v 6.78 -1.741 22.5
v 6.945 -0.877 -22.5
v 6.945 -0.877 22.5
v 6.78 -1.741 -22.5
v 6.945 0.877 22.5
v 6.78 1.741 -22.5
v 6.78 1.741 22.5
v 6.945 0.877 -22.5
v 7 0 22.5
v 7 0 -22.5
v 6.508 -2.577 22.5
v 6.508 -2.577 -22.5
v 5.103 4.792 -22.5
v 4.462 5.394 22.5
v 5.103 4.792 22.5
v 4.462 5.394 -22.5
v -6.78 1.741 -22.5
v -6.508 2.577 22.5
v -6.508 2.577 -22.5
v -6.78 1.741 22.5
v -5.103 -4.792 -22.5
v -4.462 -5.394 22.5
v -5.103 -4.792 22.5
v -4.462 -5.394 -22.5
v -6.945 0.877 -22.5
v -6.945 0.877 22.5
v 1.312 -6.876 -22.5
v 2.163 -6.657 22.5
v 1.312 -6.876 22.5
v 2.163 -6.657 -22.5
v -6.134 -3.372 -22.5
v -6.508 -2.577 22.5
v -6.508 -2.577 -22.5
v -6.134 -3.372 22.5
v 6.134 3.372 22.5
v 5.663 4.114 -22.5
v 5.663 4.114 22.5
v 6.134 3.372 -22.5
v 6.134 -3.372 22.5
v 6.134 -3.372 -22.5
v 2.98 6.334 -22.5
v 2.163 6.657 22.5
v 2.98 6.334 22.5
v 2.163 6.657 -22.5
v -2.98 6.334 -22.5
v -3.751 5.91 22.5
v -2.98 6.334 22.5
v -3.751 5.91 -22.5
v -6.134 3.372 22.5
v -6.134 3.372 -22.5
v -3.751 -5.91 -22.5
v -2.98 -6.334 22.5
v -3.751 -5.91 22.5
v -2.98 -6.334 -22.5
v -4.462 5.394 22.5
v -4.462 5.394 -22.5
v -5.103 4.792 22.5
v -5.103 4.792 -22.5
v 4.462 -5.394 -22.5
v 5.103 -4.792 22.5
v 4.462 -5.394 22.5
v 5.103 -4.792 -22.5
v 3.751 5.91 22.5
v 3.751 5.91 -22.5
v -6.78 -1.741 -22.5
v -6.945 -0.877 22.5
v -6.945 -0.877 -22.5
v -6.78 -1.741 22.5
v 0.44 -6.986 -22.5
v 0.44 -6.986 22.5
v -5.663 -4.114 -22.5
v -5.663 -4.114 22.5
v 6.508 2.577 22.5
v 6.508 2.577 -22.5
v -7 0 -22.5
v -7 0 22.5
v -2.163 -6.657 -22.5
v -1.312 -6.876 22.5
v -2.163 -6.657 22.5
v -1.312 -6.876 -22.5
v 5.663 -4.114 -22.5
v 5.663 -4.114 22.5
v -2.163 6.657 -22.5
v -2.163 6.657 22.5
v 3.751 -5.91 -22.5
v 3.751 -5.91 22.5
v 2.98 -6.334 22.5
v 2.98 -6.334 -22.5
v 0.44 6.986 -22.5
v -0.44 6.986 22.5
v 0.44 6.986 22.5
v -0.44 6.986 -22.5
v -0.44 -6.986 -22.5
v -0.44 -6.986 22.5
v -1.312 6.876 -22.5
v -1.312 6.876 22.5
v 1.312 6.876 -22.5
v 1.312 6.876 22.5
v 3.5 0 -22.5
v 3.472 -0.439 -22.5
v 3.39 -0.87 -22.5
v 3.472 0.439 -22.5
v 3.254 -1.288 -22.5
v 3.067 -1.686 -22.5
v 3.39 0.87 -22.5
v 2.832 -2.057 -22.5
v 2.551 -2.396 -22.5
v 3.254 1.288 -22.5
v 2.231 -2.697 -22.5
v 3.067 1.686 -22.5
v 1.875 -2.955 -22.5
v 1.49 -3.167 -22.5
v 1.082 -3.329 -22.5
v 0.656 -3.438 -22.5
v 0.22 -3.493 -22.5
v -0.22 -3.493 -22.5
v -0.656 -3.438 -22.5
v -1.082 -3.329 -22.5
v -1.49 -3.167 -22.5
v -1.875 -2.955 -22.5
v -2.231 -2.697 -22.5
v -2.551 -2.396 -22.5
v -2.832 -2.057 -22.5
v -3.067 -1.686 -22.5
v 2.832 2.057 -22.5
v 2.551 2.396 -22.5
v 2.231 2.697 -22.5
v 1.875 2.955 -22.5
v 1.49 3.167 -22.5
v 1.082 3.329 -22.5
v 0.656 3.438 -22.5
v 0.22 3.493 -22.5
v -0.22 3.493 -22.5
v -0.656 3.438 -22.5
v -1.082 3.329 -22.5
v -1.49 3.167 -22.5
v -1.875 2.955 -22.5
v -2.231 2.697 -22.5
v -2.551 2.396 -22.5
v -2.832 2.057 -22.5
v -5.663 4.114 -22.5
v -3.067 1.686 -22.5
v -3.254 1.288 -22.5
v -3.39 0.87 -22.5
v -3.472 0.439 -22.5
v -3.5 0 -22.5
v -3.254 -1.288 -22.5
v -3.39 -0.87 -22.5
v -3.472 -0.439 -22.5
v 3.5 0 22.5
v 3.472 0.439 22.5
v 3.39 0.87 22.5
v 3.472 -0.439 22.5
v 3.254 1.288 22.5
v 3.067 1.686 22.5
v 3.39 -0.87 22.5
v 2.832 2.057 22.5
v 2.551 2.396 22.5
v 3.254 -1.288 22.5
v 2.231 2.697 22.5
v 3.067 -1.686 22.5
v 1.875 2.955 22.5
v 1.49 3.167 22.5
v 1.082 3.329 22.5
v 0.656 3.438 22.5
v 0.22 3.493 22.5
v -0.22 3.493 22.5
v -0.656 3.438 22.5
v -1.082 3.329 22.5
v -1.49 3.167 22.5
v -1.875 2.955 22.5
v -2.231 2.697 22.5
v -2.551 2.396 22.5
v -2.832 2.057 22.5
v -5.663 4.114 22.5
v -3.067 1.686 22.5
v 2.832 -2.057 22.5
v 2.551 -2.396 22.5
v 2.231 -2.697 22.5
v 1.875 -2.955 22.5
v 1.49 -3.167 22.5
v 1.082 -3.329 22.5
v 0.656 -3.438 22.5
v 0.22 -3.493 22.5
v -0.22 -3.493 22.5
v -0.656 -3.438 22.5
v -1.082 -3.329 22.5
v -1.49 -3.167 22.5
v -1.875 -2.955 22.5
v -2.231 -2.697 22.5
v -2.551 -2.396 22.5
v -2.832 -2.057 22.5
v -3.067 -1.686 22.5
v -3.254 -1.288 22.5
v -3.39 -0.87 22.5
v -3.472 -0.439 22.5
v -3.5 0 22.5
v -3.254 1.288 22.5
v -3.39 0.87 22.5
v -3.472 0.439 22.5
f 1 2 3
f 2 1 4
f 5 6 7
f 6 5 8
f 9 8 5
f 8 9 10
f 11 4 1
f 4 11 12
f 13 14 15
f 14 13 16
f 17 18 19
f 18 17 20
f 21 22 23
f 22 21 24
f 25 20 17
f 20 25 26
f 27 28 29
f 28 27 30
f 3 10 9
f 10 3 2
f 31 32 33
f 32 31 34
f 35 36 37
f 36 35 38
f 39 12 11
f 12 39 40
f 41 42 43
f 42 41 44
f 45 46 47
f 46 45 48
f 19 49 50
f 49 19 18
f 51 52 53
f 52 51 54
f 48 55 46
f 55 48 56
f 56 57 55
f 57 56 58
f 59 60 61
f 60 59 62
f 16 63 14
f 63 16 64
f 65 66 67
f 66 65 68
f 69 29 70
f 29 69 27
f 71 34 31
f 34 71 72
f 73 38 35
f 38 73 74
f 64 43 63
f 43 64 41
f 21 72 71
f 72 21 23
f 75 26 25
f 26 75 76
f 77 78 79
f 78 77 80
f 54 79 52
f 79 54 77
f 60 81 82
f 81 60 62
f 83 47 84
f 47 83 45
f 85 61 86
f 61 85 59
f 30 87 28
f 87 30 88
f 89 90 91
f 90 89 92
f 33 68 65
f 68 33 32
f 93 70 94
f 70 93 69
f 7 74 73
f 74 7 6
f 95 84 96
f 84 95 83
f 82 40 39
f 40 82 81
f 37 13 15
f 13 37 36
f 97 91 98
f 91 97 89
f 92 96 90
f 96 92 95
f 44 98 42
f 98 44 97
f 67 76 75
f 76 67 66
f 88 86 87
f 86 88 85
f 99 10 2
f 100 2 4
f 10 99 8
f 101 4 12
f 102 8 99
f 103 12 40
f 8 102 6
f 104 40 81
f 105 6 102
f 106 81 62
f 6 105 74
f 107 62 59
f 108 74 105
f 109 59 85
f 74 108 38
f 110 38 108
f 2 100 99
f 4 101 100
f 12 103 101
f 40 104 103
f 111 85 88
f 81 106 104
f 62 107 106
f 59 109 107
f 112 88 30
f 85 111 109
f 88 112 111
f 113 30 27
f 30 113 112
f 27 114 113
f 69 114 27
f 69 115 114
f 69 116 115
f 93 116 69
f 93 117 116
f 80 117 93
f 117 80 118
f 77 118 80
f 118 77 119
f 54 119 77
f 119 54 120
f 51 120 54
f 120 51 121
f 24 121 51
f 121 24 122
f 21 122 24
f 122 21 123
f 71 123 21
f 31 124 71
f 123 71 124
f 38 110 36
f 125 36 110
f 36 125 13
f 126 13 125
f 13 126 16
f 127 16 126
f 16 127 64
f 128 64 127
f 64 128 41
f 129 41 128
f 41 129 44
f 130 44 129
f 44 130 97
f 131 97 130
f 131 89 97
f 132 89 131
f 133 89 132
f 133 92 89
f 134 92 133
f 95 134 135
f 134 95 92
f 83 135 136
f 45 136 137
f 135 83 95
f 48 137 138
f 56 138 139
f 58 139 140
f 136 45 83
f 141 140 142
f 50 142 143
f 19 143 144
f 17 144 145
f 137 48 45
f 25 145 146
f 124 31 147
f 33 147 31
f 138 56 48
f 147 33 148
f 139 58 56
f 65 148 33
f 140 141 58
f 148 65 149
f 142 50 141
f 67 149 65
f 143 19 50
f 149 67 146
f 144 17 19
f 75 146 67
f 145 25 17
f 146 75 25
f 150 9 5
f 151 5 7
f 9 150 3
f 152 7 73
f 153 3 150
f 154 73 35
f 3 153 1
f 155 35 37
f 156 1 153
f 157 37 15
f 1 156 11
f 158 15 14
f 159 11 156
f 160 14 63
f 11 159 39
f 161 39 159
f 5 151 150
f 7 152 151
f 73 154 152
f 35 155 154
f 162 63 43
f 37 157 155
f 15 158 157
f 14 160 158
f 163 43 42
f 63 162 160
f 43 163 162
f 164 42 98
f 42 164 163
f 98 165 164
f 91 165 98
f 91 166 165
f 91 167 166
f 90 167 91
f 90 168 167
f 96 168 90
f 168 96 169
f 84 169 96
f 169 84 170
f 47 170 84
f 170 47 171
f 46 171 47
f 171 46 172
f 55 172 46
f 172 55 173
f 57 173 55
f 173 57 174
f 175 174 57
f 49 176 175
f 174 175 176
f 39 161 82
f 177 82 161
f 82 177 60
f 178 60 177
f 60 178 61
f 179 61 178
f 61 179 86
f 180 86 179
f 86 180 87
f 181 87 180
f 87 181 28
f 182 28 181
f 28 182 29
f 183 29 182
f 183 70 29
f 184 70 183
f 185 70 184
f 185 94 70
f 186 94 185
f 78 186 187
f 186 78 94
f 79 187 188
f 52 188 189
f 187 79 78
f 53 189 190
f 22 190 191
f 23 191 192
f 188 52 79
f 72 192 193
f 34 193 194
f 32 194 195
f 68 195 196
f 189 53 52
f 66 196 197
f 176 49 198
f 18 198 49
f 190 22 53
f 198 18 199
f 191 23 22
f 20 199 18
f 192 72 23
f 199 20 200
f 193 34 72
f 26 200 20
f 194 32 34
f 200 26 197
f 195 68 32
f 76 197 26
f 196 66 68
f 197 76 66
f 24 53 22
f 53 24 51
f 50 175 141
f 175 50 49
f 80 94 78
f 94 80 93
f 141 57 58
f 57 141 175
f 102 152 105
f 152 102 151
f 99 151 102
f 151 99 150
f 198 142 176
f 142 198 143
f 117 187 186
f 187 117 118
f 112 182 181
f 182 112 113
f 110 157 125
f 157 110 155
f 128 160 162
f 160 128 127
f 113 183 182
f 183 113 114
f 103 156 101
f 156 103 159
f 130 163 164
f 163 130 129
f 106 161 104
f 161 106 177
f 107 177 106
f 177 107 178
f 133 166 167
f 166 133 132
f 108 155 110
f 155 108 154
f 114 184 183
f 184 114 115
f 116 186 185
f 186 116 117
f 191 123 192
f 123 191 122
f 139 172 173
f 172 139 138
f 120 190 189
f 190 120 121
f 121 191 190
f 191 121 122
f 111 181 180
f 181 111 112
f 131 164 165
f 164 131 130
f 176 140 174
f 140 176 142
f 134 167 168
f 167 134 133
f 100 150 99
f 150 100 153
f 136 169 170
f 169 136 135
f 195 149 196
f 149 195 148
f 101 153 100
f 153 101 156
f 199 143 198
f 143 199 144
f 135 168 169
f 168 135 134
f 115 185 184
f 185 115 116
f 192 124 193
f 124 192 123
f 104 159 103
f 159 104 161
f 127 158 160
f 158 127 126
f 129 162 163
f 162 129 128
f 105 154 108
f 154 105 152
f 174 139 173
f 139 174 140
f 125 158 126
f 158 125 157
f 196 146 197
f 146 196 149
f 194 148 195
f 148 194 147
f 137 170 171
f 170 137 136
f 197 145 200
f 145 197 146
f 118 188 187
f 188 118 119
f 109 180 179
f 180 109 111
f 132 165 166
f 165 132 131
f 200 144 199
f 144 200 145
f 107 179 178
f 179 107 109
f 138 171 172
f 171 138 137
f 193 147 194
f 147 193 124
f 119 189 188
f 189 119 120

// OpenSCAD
$fn = 50;


difference() {
	union() {
		translate(v = [0, 0, -22.5000000000]) {
			cylinder(h = 45, r = 7.0000000000);
		}
	}
	union() {
		translate(v = [0, 0, -100.0000000000]) {
			cylinder(h = 200, r = 3.5000000000);
		}
	}
}
